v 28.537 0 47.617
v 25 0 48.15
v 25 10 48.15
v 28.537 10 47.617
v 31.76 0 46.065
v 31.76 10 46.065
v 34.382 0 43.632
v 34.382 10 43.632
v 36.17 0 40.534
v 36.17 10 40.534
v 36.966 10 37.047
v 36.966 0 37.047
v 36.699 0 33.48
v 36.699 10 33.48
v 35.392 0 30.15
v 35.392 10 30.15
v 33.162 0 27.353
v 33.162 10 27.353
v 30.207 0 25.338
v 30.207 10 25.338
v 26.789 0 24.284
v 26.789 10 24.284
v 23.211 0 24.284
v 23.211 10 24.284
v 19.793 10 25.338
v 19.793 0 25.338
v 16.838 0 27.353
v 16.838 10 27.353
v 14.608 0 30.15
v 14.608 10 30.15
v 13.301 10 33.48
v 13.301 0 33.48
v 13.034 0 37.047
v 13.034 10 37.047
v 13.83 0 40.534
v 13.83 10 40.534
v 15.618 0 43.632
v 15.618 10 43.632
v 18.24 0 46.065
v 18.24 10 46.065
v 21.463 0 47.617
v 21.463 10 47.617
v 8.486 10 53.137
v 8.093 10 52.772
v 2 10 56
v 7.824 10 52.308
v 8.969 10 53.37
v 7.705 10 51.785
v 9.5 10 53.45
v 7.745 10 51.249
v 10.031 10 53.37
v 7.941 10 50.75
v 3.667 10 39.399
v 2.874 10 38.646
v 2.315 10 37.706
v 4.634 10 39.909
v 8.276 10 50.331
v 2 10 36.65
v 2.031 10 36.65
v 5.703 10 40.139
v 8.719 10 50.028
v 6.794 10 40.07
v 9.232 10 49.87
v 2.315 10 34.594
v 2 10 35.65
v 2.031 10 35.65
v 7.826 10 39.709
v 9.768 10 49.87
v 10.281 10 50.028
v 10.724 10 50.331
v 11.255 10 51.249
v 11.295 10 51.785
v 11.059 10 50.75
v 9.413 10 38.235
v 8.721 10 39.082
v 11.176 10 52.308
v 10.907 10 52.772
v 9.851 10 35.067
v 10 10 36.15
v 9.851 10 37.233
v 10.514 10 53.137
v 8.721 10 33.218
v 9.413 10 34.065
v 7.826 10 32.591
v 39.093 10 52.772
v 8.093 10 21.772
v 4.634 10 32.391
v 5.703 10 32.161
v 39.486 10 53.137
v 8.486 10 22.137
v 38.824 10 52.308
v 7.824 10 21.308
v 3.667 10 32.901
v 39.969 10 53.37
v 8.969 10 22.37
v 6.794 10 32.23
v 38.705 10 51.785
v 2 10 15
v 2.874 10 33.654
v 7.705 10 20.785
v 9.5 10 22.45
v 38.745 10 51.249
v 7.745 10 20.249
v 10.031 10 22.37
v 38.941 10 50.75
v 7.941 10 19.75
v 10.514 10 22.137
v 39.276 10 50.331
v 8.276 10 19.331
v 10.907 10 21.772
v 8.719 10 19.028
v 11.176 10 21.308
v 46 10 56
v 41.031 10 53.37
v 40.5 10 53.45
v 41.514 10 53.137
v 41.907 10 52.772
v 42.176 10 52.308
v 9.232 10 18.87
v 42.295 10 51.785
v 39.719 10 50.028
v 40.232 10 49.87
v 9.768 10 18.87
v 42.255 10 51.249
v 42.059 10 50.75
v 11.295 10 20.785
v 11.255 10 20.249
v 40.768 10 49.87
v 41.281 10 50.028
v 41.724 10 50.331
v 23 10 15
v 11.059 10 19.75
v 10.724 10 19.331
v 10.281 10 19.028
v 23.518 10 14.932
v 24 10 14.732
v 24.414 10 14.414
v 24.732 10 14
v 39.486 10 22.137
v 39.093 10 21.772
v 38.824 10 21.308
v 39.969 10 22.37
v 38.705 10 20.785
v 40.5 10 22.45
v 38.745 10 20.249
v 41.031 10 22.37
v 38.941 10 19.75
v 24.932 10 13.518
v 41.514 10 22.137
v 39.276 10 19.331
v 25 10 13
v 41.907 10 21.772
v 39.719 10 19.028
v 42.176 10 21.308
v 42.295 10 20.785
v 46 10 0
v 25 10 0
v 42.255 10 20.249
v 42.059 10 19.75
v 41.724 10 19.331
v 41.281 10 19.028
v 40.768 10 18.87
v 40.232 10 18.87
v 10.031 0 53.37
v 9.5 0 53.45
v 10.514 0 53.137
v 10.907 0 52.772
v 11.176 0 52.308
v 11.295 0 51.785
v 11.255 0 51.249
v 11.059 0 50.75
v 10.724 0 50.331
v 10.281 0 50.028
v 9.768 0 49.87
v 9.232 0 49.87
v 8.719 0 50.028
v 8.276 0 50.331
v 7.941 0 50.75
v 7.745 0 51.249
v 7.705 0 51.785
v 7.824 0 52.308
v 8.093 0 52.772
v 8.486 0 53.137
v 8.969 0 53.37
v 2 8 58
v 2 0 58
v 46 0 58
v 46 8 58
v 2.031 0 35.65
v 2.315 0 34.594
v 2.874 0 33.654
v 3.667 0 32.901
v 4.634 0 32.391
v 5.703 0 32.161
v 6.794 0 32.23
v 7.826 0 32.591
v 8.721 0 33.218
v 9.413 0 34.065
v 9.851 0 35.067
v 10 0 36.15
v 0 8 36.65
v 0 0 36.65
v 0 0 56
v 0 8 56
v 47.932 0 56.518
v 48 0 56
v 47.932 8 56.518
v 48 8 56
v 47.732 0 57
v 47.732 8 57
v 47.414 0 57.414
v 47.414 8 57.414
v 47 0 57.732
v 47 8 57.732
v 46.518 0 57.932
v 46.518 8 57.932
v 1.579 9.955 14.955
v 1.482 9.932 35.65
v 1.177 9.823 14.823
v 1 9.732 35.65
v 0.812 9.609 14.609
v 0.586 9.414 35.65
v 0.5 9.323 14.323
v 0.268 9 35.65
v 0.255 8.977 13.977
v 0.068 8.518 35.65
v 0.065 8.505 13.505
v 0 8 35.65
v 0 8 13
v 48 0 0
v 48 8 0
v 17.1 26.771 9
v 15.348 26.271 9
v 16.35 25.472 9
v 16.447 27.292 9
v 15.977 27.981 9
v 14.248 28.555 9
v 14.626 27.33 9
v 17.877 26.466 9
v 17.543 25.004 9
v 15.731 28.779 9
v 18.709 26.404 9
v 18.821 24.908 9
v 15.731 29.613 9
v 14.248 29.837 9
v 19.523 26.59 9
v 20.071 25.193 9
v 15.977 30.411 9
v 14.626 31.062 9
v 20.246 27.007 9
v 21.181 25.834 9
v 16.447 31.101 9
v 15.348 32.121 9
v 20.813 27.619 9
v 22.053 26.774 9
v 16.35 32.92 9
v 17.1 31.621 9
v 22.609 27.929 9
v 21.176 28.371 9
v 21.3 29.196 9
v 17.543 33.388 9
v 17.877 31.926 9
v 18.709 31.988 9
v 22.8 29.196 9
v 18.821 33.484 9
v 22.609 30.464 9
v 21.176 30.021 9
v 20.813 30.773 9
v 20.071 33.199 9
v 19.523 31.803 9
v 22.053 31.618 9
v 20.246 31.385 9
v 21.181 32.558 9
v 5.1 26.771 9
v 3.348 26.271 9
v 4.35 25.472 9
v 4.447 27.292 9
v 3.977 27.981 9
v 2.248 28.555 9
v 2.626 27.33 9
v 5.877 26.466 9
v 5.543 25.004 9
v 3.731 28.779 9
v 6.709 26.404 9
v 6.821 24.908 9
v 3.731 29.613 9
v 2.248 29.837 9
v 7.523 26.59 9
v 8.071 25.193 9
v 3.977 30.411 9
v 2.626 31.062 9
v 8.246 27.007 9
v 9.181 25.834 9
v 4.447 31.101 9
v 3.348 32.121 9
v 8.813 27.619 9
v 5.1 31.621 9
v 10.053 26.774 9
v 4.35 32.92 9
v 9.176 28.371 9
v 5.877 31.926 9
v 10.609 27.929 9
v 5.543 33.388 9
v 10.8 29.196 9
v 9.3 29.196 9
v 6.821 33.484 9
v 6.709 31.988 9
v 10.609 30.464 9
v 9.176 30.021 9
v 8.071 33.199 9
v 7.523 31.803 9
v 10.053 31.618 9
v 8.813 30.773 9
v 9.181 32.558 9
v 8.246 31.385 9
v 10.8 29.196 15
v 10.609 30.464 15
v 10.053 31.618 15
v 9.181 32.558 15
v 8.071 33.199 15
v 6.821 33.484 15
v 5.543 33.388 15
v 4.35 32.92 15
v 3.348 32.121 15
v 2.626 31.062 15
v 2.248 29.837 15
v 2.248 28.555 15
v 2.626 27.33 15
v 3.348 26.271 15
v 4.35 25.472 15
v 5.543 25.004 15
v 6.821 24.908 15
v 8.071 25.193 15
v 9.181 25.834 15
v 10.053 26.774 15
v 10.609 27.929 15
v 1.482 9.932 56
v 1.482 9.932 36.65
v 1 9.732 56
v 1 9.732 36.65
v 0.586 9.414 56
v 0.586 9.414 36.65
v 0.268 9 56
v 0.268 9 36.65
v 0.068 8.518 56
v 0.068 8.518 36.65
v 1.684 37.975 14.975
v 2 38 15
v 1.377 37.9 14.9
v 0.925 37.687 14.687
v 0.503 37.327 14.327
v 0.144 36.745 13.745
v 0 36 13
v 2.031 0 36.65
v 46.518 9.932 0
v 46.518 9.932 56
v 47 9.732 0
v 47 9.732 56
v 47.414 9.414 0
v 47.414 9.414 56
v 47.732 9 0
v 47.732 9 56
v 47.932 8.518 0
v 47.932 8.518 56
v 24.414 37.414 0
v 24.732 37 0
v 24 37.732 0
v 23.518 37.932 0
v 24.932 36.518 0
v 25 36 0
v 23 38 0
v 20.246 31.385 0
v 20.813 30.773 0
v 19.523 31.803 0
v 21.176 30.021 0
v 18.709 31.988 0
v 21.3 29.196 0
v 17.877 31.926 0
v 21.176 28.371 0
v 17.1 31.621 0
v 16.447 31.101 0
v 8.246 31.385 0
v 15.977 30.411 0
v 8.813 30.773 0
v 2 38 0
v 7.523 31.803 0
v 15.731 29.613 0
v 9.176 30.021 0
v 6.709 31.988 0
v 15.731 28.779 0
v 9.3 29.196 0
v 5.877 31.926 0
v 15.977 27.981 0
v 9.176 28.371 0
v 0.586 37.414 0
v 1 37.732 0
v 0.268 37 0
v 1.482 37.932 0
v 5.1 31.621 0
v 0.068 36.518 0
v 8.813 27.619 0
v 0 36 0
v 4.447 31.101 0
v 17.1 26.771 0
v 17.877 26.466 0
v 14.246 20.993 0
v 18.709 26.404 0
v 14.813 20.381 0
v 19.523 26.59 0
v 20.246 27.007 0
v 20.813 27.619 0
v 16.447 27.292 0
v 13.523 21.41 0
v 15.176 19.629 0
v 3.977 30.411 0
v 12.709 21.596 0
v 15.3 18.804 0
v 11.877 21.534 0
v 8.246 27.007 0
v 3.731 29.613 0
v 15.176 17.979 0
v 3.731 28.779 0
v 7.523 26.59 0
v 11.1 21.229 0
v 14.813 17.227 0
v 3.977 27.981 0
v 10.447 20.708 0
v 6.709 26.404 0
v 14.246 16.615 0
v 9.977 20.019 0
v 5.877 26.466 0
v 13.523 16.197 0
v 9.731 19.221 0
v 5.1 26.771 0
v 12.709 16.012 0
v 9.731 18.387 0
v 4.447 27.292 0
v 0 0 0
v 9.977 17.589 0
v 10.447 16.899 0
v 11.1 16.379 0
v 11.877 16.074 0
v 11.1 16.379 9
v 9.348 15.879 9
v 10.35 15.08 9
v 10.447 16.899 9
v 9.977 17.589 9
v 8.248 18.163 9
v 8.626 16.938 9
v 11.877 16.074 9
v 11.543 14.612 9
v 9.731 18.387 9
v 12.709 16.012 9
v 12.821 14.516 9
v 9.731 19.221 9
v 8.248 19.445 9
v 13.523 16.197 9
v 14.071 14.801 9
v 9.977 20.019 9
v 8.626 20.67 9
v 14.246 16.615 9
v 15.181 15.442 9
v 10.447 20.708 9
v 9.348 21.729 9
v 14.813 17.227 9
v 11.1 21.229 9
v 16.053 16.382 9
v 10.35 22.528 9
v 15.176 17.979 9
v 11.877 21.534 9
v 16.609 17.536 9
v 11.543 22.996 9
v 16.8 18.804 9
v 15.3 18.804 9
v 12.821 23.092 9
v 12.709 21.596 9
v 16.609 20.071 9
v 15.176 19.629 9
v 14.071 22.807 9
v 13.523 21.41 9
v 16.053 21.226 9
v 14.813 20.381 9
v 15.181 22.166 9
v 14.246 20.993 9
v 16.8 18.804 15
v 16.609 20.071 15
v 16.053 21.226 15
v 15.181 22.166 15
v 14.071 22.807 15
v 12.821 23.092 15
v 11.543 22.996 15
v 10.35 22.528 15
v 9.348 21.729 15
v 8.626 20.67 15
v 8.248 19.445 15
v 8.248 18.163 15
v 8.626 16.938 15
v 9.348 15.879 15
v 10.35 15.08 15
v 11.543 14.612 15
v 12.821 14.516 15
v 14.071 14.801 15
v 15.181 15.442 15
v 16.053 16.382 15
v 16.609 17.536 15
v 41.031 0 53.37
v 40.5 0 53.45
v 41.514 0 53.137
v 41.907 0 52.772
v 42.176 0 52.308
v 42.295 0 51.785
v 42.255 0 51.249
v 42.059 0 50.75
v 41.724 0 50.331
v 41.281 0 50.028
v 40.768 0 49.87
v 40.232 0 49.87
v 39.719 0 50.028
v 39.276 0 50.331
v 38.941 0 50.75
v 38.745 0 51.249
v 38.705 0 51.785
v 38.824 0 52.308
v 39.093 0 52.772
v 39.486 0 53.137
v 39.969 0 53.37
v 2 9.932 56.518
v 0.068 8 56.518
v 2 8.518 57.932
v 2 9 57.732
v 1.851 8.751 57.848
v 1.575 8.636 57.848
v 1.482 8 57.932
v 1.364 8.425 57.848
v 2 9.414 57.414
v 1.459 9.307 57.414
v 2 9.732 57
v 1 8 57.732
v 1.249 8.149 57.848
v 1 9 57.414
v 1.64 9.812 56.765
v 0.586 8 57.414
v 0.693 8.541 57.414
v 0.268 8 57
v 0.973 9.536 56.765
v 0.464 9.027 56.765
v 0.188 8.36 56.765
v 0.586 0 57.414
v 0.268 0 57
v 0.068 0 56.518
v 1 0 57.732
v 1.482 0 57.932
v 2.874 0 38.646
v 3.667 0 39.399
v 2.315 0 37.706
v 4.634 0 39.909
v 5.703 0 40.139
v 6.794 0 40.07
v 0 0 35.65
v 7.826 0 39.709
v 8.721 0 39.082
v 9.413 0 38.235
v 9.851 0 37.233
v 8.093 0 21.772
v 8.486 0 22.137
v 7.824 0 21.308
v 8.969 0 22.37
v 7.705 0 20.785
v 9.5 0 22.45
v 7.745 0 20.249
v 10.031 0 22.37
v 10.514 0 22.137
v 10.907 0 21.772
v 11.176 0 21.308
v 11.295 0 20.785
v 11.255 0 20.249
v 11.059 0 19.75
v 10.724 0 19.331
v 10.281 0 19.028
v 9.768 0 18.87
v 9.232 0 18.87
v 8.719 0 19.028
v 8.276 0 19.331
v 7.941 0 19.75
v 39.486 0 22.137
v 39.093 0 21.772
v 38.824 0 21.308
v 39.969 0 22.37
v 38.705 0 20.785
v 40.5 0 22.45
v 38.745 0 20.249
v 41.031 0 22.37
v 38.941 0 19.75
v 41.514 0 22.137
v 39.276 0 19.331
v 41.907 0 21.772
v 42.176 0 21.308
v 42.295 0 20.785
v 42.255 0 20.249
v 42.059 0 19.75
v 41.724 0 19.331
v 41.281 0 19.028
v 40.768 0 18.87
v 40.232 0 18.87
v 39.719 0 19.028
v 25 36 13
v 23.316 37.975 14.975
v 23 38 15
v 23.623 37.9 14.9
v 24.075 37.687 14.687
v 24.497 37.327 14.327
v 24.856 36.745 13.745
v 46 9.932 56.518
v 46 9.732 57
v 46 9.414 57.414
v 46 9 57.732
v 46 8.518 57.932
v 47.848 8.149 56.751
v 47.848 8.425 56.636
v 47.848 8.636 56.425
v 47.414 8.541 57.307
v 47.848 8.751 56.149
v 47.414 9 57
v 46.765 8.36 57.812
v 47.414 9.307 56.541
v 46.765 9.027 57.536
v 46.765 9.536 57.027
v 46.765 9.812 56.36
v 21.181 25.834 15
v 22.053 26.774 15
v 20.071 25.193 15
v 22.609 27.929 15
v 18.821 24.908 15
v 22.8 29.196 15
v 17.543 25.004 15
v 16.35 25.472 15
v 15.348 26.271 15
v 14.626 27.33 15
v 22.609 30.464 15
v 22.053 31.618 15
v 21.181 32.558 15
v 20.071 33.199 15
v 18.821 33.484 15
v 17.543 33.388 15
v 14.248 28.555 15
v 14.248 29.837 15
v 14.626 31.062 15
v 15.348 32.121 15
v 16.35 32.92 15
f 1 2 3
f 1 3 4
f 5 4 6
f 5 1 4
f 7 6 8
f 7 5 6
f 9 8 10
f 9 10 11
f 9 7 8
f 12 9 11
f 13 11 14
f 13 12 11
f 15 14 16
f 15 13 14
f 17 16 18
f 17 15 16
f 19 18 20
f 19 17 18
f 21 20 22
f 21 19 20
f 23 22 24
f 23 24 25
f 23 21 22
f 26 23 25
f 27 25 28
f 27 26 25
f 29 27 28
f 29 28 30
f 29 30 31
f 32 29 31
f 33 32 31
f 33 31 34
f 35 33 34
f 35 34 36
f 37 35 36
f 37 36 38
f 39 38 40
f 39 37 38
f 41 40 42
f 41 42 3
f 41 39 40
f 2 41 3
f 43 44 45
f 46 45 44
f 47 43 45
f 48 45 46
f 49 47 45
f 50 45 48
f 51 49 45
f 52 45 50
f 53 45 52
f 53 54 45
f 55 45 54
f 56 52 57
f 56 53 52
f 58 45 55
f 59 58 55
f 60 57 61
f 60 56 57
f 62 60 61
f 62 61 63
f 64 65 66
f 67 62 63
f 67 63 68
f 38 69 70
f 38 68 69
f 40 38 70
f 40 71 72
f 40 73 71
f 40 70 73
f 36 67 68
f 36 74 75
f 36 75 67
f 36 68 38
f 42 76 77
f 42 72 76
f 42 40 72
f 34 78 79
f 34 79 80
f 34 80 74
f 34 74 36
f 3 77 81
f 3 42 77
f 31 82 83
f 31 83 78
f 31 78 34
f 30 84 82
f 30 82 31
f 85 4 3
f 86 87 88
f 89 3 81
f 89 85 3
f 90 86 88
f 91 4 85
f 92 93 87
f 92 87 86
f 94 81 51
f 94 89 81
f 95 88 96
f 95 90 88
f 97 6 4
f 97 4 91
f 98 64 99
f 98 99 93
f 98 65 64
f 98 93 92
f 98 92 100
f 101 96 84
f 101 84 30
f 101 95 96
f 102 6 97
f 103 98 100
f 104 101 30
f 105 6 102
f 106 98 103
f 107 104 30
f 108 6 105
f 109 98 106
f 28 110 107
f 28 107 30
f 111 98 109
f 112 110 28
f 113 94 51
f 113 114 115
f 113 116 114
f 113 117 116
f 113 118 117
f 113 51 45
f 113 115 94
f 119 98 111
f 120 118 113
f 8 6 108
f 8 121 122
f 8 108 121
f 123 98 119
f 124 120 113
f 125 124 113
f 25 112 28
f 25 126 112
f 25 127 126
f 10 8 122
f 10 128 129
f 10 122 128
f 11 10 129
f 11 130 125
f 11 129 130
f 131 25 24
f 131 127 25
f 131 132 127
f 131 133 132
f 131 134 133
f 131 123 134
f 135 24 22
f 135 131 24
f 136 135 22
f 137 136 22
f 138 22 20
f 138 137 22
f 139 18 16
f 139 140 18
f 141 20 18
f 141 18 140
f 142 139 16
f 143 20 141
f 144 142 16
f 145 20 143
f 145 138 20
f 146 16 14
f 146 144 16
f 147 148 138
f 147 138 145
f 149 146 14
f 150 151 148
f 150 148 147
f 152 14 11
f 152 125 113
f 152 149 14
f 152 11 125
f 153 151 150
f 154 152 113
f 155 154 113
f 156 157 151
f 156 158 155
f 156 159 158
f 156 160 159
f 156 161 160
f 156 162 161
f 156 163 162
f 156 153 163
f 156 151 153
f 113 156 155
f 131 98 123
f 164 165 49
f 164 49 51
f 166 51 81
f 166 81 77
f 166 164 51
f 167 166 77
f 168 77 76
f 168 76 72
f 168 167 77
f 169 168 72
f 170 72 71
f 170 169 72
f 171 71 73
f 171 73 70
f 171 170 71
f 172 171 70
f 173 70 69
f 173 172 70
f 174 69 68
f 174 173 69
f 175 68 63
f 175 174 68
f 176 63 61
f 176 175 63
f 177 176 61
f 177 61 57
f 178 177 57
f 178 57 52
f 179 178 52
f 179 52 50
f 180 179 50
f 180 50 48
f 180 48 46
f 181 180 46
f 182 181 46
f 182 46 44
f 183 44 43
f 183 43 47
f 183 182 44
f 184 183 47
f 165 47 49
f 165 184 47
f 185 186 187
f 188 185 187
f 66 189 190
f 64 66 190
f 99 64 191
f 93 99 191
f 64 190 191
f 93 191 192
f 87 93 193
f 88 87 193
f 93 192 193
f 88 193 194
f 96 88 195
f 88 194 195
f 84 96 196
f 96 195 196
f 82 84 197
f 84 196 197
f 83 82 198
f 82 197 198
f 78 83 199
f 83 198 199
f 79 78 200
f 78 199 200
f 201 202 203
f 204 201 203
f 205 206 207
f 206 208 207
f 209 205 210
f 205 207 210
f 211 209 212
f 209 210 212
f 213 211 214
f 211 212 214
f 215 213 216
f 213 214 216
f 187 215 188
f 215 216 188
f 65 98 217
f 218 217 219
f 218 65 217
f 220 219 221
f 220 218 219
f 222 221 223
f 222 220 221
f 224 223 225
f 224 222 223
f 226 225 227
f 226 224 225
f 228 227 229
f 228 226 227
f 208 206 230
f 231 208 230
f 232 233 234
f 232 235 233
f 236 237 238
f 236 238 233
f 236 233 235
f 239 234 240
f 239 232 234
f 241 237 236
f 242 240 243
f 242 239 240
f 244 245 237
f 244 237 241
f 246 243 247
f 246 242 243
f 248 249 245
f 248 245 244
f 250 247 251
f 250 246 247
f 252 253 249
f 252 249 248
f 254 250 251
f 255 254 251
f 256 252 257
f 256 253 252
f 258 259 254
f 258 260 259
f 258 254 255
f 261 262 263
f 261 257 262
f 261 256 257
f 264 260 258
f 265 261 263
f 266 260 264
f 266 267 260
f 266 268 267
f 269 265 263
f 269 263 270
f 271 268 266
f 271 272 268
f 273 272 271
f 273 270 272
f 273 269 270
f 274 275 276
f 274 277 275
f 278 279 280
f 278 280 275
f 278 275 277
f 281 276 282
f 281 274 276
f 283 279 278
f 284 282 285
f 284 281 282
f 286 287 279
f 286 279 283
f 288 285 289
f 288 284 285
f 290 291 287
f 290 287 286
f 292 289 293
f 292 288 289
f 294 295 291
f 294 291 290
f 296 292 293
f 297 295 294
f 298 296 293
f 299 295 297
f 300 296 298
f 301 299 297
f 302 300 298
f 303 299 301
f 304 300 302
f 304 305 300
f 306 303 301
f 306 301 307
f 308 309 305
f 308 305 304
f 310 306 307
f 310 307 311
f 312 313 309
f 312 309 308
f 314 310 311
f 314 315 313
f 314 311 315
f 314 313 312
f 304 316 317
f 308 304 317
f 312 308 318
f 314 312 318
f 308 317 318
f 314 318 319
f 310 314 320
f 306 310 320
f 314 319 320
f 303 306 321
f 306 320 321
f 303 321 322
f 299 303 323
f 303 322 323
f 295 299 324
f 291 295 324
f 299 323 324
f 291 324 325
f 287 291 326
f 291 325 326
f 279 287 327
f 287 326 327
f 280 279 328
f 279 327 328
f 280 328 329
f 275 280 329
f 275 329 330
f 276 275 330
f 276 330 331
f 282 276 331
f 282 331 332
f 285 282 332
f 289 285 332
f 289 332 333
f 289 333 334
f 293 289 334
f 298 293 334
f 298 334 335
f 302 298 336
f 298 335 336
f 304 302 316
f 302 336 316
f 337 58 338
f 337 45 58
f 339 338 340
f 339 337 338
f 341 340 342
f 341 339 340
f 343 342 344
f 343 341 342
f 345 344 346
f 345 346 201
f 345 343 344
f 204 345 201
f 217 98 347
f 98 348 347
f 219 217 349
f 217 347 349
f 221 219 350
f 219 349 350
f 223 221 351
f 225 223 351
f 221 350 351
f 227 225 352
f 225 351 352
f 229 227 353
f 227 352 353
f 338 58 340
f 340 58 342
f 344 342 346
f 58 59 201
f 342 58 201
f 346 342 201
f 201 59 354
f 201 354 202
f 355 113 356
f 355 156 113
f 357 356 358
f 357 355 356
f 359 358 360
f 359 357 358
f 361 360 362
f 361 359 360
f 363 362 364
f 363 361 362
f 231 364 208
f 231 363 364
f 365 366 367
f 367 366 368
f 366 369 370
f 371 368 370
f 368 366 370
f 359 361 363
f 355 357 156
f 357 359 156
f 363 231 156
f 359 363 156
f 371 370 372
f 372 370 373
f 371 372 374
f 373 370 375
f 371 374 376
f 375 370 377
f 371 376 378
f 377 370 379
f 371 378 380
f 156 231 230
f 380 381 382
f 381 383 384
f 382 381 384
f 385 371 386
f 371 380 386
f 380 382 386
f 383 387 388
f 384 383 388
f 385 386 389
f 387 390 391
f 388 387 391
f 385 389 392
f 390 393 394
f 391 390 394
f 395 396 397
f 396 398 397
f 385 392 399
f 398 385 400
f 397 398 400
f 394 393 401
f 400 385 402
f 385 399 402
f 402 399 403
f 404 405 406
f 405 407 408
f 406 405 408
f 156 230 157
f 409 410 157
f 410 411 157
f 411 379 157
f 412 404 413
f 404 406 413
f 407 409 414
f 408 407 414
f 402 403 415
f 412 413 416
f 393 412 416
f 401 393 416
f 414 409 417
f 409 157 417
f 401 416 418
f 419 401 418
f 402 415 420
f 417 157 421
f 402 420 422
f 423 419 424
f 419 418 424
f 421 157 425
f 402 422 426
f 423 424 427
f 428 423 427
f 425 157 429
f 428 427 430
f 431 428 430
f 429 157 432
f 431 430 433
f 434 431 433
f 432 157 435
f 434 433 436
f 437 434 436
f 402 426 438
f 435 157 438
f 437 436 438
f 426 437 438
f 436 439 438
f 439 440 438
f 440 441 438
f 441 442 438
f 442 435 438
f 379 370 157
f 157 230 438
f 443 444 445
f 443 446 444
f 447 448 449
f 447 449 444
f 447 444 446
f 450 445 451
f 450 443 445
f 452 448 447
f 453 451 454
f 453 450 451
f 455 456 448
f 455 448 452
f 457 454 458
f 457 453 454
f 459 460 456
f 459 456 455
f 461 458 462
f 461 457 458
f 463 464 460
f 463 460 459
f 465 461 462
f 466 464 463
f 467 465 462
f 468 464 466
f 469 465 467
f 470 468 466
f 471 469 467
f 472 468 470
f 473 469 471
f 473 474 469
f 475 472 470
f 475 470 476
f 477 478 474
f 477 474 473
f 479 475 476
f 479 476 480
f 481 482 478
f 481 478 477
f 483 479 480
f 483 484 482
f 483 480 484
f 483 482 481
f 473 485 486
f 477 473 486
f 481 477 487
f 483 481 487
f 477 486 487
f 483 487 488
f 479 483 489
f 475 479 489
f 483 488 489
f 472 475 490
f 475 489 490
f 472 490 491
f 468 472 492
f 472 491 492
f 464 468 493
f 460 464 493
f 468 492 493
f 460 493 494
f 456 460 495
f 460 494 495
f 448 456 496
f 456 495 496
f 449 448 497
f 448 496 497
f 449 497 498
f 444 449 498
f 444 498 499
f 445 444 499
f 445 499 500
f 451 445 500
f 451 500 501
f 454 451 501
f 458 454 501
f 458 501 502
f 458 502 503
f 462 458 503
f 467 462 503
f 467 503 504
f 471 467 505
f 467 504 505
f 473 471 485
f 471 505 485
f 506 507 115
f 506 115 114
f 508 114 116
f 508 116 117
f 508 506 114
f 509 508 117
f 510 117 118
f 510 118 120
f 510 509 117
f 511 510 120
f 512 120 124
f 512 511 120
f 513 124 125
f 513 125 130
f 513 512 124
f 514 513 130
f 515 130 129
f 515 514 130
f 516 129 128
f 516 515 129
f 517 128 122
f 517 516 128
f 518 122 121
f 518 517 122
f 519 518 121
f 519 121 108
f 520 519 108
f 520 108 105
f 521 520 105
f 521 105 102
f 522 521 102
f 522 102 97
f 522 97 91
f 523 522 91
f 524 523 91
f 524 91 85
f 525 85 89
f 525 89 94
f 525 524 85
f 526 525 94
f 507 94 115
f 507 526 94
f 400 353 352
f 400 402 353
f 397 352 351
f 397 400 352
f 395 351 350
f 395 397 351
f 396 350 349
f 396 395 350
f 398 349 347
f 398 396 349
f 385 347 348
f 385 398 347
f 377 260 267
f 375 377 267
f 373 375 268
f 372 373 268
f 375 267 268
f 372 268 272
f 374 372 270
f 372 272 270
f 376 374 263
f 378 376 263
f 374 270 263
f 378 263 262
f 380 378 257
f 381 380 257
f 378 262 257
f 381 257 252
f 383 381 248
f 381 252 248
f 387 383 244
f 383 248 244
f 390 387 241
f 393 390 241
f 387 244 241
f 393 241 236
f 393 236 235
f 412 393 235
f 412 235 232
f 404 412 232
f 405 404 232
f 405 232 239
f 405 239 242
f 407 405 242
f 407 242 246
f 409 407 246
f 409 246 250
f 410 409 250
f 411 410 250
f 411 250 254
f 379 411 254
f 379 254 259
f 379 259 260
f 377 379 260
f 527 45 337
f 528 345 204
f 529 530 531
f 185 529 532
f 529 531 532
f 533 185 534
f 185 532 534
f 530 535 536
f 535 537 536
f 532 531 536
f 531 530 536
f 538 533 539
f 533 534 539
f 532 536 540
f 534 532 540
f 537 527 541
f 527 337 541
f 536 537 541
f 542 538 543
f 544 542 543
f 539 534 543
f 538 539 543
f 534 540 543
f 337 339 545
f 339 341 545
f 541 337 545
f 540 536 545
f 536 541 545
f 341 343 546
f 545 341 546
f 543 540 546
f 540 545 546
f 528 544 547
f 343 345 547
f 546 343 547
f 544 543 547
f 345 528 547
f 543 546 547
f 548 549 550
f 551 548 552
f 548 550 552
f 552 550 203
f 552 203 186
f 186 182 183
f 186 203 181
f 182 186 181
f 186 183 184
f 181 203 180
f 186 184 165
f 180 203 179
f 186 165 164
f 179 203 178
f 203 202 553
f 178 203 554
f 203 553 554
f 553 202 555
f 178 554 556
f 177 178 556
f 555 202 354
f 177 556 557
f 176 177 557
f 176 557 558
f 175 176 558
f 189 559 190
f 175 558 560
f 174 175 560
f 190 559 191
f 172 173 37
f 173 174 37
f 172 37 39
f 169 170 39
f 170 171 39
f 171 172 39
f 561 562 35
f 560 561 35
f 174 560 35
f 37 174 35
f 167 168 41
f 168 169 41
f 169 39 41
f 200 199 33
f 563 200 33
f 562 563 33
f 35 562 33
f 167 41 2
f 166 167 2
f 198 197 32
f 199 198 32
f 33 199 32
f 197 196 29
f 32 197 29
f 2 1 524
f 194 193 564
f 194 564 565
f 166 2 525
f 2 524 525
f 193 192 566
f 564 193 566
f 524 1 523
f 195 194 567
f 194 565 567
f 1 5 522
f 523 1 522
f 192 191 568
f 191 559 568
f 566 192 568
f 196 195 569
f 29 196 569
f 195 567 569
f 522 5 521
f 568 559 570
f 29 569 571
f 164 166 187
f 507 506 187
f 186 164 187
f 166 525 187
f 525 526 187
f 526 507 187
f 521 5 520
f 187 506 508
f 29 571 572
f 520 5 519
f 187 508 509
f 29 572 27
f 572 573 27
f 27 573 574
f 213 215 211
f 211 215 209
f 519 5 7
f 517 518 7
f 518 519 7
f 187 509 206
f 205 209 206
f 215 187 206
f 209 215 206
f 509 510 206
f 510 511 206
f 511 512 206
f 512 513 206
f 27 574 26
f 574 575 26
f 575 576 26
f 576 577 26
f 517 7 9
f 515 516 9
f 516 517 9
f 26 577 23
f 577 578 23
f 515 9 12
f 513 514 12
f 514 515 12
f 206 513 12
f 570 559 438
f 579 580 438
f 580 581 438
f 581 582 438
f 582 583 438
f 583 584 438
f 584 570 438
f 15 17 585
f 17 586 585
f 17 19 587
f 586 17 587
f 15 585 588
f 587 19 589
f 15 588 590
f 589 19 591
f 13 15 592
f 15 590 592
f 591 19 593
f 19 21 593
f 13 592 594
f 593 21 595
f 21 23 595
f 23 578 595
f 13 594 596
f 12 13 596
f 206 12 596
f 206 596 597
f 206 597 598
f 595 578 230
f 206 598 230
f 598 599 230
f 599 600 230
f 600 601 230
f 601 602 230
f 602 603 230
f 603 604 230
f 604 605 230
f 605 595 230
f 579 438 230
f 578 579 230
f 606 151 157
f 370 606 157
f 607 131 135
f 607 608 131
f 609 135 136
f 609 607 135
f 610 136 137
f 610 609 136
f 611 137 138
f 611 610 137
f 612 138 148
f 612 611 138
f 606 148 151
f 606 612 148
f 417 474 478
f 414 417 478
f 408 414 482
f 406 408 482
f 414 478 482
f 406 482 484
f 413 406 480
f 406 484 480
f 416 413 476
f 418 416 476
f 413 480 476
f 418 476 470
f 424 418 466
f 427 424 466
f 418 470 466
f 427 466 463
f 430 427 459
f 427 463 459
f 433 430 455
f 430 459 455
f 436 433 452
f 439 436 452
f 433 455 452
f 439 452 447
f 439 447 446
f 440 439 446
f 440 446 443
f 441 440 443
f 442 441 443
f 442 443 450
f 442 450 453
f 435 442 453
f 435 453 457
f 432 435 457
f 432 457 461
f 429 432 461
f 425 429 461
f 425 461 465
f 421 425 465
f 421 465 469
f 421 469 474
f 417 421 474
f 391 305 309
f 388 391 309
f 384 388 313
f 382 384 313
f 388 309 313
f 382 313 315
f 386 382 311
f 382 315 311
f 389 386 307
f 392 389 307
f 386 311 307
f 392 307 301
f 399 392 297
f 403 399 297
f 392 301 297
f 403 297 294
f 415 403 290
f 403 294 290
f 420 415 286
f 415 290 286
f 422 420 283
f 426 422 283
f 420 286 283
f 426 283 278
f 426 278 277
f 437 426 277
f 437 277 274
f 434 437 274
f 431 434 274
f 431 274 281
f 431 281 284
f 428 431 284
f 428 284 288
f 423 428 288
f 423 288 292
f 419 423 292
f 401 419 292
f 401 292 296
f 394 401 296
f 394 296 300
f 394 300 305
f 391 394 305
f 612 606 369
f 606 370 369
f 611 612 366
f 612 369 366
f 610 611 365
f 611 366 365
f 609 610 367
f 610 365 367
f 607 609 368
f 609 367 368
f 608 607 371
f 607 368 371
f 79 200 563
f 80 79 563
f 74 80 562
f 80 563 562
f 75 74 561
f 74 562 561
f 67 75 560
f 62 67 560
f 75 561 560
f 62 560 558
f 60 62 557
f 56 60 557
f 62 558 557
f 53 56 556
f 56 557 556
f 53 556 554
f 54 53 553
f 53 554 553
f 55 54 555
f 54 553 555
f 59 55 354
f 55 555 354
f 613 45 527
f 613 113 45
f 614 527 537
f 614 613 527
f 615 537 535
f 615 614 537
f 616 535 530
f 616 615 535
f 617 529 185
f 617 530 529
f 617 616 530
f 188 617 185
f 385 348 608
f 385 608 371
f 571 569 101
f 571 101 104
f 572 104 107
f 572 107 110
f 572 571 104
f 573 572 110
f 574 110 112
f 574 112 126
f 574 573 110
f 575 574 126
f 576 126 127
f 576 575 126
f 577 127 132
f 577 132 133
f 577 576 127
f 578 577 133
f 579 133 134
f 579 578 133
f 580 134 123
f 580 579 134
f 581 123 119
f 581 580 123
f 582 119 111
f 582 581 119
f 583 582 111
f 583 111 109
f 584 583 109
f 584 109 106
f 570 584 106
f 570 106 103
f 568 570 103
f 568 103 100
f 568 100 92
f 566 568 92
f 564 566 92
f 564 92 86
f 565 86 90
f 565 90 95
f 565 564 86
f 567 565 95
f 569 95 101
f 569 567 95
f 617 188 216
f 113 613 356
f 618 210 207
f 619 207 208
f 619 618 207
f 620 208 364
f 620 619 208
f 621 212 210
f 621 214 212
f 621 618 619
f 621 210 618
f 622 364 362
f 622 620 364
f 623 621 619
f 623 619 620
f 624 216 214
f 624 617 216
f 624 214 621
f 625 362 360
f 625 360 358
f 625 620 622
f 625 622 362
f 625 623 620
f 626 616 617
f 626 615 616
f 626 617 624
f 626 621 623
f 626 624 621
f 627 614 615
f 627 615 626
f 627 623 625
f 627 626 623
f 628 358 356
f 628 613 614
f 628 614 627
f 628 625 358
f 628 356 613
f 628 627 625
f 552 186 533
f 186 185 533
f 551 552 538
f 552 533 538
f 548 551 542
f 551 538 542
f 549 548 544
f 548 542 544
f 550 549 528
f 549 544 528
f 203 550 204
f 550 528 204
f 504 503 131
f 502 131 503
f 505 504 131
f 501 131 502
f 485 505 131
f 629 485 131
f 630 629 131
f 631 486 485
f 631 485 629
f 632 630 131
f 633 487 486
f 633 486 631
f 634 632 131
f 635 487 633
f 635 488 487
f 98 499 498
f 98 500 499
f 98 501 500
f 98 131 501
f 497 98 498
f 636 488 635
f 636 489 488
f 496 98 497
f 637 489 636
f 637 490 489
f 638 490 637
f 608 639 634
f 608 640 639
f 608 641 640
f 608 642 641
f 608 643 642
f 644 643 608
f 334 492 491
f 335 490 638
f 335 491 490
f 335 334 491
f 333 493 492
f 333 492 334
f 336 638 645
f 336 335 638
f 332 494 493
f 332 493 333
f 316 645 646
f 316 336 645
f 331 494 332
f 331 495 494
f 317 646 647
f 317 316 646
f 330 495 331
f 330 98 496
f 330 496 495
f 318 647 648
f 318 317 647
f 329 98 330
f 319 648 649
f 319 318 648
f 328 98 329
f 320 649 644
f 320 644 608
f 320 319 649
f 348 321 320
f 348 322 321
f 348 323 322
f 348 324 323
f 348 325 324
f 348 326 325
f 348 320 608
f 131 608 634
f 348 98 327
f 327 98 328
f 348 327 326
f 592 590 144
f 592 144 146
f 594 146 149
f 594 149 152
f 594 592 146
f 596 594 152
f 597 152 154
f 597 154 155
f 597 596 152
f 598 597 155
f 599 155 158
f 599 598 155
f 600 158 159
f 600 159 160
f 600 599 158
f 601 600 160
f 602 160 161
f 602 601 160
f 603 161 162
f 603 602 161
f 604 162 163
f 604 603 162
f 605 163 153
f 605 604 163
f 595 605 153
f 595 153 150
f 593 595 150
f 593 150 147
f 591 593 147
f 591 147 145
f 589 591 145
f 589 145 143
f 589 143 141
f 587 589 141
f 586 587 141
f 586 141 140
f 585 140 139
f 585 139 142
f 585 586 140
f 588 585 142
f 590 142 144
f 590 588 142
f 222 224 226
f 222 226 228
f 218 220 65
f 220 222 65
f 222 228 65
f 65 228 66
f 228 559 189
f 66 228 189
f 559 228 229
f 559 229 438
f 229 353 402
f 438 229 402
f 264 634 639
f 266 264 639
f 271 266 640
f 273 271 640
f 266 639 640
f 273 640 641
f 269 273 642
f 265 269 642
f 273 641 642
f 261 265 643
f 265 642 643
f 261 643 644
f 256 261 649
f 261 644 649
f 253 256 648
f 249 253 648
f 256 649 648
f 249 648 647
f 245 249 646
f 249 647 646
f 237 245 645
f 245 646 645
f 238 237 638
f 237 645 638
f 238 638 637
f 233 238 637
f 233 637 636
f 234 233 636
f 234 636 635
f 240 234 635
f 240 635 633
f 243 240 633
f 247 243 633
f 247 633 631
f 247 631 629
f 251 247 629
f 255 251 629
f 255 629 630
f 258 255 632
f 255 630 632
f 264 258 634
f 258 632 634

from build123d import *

# Parameters (mm, degrees)
SKETCH1_R           = 1.8
SKETCH1_R_2         = 12
BOSS_EXTRUDE1_DEPTH = 10
SKETCH2_W           = 15
SKETCH2_H           = 28
BOSS_EXTRUDE2_DEPTH = 25
SKETCH3_R           = 2.8
CUT_EXTRUDE1_DEPTH  = 75.813100457
SKETCH4_R           = 4.3
CUT_EXTRUDE2_DEPTH  = 6
FILLET1_R           = 2


with BuildPart() as part:
    # Sketch1 → Boss-Extrude1 (new body)
    with BuildSketch(Plane(origin=(0, 0, 0), x_dir=(1, 0, 0), z_dir=(0, 1, 0))):
        with BuildLine():
            Line((48, 0), (0, 0))
            Line((0, 0), (0, -35.65))
            Line((0, -35.65), (2.031373033, -35.65))
            ThreePointArc((2.031373033, -35.65), (6.25049165, -32.157850963), (10, -36.15))
            ThreePointArc((10, -36.15), (6.25049165, -40.142149037), (2.031373033, -36.65))
            Line((2.031373033, -36.65), (0, -36.65))
            Line((0, -36.65), (0, -58))
            Line((0, -58), (48, -58))
            Line((48, -58), (48, 0))
        make_face()
        with Locations(Location((9.5, -51.65, 0), (0, 0, 270))):
            Circle(SKETCH1_R, mode=Mode.SUBTRACT)
        with Locations(Location((40.5, -51.65, 0), (0, 0, 270))):
            Circle(SKETCH1_R, mode=Mode.SUBTRACT)
        with Locations(Location((25, -36.15, 0), (0, 0, 270))):
            Circle(SKETCH1_R_2, mode=Mode.SUBTRACT)
        with Locations(Location((9.5, -20.65, 0), (0, 0, 270))):
            Circle(SKETCH1_R, mode=Mode.SUBTRACT)
        with Locations(Location((40.5, -20.65, 0), (0, 0, 270))):
            Circle(SKETCH1_R, mode=Mode.SUBTRACT)
    extrude(amount=BOSS_EXTRUDE1_DEPTH)

    # Sketch2 → Boss-Extrude2 (add)
    with BuildSketch(Plane(origin=(0, 0, 0), x_dir=(0, 0, -1), z_dir=(1, 0, 0))):
        with Locations((-7.5, 24)):
            Rectangle(SKETCH2_W, SKETCH2_H)
    extrude(amount=BOSS_EXTRUDE2_DEPTH)

    # Sketch3 → Cut-Extrude1 (cut, through all)
    with BuildSketch(Plane.XY.offset(15)):
        with Locations((6.5, 29.196152423)):
            Circle(SKETCH3_R)
        with Locations((18.5, 29.196152423)):
            Circle(SKETCH3_R)
        with Locations((12.5, 18.803847577)):
            Circle(SKETCH3_R)
    extrude(amount=-CUT_EXTRUDE1_DEPTH, mode=Mode.SUBTRACT)

    # Sketch4 → Cut-Extrude2 (cut)
    with BuildSketch(Plane.XY.offset(15)):
        with Locations((6.5, 29.196152423)):
            Circle(SKETCH4_R)
        with Locations((18.5, 29.196152423)):
            Circle(SKETCH4_R)
        with Locations((12.5, 18.803847577)):
            Circle(SKETCH4_R)
    extrude(amount=-CUT_EXTRUDE2_DEPTH, mode=Mode.SUBTRACT)

    # Fillet1
    fillet1_edges = [part.edges().sort_by_distance(p)[0] for p in [
        (0, 10, 47.325),
        (24, 10, 58),
        (48, 5, 58),
        (0, 5, 58),
        (48, 10, 29),
        (0, 10, 25.325),
        (0, 38, 7.5),
        (0, 24, 15),
        (25, 38, 7.5),
        (25, 24, 15),
    ]]
    fillet(fillet1_edges, radius=FILLET1_R)


solid = part.part
